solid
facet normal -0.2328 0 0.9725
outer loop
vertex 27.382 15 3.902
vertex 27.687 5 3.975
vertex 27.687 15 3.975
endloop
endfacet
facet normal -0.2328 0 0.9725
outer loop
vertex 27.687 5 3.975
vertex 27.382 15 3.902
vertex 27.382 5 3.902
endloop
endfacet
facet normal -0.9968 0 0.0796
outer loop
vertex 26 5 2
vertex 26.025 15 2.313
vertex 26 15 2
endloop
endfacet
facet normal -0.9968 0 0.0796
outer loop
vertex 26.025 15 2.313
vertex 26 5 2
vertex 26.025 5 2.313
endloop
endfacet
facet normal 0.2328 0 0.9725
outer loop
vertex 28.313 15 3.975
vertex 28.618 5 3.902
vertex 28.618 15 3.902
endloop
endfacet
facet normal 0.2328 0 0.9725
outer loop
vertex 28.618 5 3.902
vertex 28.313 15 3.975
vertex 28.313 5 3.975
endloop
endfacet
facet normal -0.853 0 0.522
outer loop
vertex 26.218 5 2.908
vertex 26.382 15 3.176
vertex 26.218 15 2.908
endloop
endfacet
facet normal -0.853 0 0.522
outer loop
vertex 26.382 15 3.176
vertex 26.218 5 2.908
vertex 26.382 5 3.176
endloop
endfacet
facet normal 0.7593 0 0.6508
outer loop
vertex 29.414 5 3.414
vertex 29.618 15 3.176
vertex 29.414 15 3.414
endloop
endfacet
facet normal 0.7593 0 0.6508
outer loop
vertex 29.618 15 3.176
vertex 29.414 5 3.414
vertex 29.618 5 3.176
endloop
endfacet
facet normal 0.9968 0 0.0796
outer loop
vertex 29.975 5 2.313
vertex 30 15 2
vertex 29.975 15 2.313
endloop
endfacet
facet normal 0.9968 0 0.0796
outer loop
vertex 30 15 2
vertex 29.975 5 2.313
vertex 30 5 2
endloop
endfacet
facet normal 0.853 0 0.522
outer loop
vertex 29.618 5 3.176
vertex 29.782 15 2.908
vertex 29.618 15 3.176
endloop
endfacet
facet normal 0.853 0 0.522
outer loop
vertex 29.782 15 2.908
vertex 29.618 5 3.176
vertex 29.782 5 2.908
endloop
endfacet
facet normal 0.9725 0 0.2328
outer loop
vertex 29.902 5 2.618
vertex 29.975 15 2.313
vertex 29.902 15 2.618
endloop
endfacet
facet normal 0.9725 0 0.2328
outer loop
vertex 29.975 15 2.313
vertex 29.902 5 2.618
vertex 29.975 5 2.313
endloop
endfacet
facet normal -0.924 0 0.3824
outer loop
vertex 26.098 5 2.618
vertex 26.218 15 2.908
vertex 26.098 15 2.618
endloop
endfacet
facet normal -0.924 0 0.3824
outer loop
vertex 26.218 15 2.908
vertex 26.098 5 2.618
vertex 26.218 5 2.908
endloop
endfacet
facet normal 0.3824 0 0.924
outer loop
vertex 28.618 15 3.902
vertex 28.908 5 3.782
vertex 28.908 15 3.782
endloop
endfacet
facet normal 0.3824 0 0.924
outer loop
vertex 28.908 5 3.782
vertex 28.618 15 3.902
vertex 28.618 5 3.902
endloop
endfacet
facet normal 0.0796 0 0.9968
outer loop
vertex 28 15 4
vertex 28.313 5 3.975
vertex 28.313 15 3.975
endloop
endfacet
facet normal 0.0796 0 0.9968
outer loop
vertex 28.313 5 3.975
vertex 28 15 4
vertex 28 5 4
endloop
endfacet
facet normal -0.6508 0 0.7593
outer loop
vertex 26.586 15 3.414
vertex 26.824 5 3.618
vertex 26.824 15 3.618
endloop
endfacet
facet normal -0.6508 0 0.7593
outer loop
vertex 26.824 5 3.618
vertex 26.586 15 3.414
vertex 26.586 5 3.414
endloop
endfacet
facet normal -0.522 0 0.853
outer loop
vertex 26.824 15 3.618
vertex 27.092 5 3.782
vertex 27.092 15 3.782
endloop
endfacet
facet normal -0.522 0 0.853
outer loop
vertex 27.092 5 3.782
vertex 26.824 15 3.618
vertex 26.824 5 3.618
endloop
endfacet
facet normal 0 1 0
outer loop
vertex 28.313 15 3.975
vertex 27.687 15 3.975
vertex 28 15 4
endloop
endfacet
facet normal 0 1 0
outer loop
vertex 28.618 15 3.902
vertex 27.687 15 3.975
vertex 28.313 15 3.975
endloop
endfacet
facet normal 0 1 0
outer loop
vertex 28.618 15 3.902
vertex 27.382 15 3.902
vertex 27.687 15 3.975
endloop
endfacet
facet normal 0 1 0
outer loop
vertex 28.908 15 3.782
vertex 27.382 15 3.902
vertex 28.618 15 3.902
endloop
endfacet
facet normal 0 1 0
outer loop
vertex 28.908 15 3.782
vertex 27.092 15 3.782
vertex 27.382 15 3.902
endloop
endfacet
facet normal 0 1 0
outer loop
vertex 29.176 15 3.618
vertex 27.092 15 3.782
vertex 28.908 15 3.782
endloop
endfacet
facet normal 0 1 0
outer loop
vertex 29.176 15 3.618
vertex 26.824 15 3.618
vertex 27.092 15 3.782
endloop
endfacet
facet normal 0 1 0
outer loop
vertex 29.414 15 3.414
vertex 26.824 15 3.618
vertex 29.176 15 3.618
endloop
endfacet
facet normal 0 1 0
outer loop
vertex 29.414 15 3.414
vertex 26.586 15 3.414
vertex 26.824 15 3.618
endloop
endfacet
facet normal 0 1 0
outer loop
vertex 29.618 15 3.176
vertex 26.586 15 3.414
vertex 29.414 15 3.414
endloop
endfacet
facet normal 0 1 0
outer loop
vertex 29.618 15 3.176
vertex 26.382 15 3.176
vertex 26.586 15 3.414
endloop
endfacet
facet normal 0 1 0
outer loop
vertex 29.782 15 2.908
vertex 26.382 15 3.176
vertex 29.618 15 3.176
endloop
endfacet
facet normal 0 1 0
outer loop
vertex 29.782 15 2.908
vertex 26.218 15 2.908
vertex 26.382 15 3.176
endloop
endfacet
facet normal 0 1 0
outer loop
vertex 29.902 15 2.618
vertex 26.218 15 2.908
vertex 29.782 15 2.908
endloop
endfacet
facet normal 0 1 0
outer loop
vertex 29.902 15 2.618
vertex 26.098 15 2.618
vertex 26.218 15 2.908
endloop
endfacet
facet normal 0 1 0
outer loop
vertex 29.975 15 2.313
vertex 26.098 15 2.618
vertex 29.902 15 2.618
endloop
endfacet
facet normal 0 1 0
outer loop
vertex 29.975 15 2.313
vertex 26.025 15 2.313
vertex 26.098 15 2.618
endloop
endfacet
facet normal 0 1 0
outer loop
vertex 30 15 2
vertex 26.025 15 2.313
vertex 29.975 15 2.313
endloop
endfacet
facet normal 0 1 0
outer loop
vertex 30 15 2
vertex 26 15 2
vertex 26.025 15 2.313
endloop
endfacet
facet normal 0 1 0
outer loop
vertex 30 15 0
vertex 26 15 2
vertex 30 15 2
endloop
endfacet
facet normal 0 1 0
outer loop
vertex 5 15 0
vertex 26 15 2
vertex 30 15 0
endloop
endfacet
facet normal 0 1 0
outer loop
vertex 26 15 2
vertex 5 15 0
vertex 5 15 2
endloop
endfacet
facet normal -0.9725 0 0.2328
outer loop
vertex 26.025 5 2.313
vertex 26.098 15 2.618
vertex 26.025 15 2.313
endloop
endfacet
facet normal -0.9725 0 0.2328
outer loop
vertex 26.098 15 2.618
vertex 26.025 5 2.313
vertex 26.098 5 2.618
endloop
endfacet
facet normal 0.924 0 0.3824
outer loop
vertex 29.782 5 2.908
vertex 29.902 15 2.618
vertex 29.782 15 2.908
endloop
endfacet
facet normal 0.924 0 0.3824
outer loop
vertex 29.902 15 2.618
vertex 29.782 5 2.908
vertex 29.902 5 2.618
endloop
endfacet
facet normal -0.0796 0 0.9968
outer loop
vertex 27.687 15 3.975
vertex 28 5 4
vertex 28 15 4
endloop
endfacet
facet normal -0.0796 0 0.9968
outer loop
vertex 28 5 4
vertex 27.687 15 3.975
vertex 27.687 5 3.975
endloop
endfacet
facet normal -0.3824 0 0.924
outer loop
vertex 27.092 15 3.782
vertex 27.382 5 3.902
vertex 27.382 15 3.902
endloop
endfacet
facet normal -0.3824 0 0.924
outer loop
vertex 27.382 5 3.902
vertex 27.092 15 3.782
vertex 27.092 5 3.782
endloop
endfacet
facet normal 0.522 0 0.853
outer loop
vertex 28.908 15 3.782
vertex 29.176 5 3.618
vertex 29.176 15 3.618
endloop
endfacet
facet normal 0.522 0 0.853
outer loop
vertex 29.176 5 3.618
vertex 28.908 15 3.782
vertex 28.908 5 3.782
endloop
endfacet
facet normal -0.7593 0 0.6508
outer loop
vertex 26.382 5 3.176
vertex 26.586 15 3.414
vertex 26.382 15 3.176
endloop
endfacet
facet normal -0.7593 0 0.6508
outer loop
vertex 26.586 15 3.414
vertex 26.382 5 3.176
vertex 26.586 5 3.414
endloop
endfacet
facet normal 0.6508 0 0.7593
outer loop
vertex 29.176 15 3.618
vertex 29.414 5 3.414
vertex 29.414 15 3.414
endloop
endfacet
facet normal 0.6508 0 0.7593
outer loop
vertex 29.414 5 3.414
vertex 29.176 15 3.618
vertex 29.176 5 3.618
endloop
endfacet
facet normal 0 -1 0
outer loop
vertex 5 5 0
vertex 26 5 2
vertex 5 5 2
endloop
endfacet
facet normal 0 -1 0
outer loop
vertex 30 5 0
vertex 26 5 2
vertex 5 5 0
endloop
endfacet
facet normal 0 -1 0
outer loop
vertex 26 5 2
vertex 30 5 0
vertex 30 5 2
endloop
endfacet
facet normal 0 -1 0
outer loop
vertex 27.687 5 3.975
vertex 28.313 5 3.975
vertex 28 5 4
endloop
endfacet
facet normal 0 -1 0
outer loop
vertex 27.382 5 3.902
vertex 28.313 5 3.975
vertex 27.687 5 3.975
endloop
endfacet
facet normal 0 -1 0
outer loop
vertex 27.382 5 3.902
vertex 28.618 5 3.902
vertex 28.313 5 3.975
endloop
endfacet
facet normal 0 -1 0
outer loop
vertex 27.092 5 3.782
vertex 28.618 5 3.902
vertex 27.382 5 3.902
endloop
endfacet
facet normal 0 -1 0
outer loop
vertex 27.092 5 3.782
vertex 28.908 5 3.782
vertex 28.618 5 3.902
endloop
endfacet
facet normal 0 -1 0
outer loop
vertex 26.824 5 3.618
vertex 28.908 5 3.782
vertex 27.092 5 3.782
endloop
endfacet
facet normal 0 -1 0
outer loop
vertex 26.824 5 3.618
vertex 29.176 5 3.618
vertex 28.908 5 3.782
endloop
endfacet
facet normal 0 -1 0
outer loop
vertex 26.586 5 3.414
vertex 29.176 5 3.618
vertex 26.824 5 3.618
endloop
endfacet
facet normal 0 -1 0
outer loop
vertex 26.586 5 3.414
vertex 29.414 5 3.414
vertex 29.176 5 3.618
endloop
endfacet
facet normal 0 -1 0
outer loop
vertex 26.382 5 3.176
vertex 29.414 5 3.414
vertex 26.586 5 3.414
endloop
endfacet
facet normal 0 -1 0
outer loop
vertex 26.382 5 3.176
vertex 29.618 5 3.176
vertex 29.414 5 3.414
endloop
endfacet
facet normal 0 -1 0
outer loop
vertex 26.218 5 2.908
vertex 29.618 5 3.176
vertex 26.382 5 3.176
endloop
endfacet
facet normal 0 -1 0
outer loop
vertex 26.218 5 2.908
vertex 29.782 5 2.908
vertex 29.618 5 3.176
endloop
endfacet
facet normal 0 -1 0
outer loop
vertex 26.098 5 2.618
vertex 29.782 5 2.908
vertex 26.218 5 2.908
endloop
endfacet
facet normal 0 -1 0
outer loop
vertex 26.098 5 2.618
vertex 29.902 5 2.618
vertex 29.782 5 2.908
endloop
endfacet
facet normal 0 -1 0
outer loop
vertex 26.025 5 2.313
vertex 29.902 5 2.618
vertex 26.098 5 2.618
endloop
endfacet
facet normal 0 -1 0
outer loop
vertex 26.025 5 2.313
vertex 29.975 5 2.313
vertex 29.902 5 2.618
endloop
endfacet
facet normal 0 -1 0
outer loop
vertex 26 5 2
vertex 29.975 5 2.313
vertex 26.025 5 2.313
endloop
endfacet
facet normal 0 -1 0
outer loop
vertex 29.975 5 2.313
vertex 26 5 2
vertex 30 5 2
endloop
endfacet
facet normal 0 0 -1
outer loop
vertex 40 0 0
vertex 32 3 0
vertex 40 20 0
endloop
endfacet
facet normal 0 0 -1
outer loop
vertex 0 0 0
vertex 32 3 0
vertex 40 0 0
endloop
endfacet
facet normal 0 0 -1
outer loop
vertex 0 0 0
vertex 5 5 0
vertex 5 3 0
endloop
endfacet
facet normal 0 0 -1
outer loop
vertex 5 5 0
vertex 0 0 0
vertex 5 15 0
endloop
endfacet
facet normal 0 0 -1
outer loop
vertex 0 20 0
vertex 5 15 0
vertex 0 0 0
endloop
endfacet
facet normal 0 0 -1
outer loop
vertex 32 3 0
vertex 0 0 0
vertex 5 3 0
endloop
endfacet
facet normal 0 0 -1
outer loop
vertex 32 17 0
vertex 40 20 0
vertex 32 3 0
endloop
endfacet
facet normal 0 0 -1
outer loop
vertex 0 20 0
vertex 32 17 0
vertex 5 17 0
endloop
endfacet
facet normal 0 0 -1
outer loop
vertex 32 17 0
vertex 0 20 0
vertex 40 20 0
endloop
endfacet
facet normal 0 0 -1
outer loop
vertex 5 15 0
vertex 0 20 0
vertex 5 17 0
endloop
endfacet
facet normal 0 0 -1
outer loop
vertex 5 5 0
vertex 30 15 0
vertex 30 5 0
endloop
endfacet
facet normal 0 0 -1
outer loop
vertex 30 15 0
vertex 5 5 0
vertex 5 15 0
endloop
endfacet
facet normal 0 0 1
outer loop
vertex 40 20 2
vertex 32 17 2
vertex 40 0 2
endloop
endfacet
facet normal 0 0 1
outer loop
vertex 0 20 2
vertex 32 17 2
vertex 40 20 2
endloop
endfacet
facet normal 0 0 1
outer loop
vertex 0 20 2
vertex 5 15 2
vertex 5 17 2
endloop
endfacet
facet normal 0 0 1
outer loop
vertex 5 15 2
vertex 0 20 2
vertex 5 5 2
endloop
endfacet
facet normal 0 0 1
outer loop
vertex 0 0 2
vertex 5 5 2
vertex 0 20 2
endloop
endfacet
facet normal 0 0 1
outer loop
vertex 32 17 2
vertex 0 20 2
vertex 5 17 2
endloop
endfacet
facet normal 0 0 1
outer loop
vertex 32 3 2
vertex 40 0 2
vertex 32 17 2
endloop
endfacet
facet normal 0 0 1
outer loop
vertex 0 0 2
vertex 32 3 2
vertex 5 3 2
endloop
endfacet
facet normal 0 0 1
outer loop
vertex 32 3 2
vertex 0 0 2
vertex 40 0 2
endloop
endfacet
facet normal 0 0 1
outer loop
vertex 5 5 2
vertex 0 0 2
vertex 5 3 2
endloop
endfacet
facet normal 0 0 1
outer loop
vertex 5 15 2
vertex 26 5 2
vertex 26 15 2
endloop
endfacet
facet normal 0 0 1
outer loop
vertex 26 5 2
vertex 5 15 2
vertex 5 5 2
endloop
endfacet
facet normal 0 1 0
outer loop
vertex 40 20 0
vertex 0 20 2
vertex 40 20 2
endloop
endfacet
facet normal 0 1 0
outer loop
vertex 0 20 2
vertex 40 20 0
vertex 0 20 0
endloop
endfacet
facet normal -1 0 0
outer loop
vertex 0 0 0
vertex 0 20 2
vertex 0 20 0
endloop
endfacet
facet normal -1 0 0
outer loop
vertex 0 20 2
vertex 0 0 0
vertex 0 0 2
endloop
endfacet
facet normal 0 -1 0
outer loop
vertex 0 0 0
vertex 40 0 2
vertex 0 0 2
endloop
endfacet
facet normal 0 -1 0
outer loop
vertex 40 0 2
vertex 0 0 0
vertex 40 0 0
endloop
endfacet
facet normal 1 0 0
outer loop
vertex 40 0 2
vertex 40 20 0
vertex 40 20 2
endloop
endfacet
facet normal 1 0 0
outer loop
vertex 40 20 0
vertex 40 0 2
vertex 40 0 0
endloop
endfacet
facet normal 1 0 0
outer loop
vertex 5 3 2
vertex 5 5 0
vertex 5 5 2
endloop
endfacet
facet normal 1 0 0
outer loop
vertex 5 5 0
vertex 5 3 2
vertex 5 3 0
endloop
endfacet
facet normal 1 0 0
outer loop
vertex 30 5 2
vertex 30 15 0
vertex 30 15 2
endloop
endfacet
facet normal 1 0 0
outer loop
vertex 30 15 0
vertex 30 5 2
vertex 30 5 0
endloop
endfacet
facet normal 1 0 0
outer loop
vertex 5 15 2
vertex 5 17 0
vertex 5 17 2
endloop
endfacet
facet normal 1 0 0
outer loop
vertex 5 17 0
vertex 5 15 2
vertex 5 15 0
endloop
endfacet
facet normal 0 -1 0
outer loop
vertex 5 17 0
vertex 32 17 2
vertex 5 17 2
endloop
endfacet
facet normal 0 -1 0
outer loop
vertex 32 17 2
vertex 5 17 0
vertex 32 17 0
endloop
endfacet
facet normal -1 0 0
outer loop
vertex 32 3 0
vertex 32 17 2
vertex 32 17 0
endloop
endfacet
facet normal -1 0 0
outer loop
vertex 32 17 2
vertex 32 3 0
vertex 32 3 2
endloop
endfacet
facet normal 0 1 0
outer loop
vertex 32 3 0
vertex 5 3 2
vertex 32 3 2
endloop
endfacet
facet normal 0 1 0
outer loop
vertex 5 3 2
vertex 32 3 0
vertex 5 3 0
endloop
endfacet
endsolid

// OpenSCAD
body_len = 40;  body_wid = 20;  body_thick = 2;

slider_len = 50;  slider_wid = 10;  slider_thick = 4;
slider_notch_every = 5;

tab_len = 25;  tab_wid = slider_wid;  tab_x_off = 5;
tab_sep_wid = 2;
tab_cut_len = tab_len + tab_sep_wid;  tab_cut_wid = tab_wid + tab_sep_wid * 2;
tab_y_off = (body_wid - tab_cut_wid) / 2;
tab_block_z = 2;  tab_block_mode = "cyl";

$fn = $preview ? 20 : 40;

if (tab_block_mode == "cyl") {
    translate([tab_x_off + tab_len - tab_block_z, tab_y_off + tab_sep_wid, body_thick])
    rotate([-90, 0, 0]) cylinder(h=tab_wid, r=tab_block_z);
}

linear_extrude(body_thick) difference() {
    square([body_len, body_wid]);
    translate([tab_x_off, tab_y_off]) difference() {
        square([tab_cut_len, tab_cut_wid]);
        translate([0, tab_sep_wid]) square([tab_len, tab_wid]);
    }
}
